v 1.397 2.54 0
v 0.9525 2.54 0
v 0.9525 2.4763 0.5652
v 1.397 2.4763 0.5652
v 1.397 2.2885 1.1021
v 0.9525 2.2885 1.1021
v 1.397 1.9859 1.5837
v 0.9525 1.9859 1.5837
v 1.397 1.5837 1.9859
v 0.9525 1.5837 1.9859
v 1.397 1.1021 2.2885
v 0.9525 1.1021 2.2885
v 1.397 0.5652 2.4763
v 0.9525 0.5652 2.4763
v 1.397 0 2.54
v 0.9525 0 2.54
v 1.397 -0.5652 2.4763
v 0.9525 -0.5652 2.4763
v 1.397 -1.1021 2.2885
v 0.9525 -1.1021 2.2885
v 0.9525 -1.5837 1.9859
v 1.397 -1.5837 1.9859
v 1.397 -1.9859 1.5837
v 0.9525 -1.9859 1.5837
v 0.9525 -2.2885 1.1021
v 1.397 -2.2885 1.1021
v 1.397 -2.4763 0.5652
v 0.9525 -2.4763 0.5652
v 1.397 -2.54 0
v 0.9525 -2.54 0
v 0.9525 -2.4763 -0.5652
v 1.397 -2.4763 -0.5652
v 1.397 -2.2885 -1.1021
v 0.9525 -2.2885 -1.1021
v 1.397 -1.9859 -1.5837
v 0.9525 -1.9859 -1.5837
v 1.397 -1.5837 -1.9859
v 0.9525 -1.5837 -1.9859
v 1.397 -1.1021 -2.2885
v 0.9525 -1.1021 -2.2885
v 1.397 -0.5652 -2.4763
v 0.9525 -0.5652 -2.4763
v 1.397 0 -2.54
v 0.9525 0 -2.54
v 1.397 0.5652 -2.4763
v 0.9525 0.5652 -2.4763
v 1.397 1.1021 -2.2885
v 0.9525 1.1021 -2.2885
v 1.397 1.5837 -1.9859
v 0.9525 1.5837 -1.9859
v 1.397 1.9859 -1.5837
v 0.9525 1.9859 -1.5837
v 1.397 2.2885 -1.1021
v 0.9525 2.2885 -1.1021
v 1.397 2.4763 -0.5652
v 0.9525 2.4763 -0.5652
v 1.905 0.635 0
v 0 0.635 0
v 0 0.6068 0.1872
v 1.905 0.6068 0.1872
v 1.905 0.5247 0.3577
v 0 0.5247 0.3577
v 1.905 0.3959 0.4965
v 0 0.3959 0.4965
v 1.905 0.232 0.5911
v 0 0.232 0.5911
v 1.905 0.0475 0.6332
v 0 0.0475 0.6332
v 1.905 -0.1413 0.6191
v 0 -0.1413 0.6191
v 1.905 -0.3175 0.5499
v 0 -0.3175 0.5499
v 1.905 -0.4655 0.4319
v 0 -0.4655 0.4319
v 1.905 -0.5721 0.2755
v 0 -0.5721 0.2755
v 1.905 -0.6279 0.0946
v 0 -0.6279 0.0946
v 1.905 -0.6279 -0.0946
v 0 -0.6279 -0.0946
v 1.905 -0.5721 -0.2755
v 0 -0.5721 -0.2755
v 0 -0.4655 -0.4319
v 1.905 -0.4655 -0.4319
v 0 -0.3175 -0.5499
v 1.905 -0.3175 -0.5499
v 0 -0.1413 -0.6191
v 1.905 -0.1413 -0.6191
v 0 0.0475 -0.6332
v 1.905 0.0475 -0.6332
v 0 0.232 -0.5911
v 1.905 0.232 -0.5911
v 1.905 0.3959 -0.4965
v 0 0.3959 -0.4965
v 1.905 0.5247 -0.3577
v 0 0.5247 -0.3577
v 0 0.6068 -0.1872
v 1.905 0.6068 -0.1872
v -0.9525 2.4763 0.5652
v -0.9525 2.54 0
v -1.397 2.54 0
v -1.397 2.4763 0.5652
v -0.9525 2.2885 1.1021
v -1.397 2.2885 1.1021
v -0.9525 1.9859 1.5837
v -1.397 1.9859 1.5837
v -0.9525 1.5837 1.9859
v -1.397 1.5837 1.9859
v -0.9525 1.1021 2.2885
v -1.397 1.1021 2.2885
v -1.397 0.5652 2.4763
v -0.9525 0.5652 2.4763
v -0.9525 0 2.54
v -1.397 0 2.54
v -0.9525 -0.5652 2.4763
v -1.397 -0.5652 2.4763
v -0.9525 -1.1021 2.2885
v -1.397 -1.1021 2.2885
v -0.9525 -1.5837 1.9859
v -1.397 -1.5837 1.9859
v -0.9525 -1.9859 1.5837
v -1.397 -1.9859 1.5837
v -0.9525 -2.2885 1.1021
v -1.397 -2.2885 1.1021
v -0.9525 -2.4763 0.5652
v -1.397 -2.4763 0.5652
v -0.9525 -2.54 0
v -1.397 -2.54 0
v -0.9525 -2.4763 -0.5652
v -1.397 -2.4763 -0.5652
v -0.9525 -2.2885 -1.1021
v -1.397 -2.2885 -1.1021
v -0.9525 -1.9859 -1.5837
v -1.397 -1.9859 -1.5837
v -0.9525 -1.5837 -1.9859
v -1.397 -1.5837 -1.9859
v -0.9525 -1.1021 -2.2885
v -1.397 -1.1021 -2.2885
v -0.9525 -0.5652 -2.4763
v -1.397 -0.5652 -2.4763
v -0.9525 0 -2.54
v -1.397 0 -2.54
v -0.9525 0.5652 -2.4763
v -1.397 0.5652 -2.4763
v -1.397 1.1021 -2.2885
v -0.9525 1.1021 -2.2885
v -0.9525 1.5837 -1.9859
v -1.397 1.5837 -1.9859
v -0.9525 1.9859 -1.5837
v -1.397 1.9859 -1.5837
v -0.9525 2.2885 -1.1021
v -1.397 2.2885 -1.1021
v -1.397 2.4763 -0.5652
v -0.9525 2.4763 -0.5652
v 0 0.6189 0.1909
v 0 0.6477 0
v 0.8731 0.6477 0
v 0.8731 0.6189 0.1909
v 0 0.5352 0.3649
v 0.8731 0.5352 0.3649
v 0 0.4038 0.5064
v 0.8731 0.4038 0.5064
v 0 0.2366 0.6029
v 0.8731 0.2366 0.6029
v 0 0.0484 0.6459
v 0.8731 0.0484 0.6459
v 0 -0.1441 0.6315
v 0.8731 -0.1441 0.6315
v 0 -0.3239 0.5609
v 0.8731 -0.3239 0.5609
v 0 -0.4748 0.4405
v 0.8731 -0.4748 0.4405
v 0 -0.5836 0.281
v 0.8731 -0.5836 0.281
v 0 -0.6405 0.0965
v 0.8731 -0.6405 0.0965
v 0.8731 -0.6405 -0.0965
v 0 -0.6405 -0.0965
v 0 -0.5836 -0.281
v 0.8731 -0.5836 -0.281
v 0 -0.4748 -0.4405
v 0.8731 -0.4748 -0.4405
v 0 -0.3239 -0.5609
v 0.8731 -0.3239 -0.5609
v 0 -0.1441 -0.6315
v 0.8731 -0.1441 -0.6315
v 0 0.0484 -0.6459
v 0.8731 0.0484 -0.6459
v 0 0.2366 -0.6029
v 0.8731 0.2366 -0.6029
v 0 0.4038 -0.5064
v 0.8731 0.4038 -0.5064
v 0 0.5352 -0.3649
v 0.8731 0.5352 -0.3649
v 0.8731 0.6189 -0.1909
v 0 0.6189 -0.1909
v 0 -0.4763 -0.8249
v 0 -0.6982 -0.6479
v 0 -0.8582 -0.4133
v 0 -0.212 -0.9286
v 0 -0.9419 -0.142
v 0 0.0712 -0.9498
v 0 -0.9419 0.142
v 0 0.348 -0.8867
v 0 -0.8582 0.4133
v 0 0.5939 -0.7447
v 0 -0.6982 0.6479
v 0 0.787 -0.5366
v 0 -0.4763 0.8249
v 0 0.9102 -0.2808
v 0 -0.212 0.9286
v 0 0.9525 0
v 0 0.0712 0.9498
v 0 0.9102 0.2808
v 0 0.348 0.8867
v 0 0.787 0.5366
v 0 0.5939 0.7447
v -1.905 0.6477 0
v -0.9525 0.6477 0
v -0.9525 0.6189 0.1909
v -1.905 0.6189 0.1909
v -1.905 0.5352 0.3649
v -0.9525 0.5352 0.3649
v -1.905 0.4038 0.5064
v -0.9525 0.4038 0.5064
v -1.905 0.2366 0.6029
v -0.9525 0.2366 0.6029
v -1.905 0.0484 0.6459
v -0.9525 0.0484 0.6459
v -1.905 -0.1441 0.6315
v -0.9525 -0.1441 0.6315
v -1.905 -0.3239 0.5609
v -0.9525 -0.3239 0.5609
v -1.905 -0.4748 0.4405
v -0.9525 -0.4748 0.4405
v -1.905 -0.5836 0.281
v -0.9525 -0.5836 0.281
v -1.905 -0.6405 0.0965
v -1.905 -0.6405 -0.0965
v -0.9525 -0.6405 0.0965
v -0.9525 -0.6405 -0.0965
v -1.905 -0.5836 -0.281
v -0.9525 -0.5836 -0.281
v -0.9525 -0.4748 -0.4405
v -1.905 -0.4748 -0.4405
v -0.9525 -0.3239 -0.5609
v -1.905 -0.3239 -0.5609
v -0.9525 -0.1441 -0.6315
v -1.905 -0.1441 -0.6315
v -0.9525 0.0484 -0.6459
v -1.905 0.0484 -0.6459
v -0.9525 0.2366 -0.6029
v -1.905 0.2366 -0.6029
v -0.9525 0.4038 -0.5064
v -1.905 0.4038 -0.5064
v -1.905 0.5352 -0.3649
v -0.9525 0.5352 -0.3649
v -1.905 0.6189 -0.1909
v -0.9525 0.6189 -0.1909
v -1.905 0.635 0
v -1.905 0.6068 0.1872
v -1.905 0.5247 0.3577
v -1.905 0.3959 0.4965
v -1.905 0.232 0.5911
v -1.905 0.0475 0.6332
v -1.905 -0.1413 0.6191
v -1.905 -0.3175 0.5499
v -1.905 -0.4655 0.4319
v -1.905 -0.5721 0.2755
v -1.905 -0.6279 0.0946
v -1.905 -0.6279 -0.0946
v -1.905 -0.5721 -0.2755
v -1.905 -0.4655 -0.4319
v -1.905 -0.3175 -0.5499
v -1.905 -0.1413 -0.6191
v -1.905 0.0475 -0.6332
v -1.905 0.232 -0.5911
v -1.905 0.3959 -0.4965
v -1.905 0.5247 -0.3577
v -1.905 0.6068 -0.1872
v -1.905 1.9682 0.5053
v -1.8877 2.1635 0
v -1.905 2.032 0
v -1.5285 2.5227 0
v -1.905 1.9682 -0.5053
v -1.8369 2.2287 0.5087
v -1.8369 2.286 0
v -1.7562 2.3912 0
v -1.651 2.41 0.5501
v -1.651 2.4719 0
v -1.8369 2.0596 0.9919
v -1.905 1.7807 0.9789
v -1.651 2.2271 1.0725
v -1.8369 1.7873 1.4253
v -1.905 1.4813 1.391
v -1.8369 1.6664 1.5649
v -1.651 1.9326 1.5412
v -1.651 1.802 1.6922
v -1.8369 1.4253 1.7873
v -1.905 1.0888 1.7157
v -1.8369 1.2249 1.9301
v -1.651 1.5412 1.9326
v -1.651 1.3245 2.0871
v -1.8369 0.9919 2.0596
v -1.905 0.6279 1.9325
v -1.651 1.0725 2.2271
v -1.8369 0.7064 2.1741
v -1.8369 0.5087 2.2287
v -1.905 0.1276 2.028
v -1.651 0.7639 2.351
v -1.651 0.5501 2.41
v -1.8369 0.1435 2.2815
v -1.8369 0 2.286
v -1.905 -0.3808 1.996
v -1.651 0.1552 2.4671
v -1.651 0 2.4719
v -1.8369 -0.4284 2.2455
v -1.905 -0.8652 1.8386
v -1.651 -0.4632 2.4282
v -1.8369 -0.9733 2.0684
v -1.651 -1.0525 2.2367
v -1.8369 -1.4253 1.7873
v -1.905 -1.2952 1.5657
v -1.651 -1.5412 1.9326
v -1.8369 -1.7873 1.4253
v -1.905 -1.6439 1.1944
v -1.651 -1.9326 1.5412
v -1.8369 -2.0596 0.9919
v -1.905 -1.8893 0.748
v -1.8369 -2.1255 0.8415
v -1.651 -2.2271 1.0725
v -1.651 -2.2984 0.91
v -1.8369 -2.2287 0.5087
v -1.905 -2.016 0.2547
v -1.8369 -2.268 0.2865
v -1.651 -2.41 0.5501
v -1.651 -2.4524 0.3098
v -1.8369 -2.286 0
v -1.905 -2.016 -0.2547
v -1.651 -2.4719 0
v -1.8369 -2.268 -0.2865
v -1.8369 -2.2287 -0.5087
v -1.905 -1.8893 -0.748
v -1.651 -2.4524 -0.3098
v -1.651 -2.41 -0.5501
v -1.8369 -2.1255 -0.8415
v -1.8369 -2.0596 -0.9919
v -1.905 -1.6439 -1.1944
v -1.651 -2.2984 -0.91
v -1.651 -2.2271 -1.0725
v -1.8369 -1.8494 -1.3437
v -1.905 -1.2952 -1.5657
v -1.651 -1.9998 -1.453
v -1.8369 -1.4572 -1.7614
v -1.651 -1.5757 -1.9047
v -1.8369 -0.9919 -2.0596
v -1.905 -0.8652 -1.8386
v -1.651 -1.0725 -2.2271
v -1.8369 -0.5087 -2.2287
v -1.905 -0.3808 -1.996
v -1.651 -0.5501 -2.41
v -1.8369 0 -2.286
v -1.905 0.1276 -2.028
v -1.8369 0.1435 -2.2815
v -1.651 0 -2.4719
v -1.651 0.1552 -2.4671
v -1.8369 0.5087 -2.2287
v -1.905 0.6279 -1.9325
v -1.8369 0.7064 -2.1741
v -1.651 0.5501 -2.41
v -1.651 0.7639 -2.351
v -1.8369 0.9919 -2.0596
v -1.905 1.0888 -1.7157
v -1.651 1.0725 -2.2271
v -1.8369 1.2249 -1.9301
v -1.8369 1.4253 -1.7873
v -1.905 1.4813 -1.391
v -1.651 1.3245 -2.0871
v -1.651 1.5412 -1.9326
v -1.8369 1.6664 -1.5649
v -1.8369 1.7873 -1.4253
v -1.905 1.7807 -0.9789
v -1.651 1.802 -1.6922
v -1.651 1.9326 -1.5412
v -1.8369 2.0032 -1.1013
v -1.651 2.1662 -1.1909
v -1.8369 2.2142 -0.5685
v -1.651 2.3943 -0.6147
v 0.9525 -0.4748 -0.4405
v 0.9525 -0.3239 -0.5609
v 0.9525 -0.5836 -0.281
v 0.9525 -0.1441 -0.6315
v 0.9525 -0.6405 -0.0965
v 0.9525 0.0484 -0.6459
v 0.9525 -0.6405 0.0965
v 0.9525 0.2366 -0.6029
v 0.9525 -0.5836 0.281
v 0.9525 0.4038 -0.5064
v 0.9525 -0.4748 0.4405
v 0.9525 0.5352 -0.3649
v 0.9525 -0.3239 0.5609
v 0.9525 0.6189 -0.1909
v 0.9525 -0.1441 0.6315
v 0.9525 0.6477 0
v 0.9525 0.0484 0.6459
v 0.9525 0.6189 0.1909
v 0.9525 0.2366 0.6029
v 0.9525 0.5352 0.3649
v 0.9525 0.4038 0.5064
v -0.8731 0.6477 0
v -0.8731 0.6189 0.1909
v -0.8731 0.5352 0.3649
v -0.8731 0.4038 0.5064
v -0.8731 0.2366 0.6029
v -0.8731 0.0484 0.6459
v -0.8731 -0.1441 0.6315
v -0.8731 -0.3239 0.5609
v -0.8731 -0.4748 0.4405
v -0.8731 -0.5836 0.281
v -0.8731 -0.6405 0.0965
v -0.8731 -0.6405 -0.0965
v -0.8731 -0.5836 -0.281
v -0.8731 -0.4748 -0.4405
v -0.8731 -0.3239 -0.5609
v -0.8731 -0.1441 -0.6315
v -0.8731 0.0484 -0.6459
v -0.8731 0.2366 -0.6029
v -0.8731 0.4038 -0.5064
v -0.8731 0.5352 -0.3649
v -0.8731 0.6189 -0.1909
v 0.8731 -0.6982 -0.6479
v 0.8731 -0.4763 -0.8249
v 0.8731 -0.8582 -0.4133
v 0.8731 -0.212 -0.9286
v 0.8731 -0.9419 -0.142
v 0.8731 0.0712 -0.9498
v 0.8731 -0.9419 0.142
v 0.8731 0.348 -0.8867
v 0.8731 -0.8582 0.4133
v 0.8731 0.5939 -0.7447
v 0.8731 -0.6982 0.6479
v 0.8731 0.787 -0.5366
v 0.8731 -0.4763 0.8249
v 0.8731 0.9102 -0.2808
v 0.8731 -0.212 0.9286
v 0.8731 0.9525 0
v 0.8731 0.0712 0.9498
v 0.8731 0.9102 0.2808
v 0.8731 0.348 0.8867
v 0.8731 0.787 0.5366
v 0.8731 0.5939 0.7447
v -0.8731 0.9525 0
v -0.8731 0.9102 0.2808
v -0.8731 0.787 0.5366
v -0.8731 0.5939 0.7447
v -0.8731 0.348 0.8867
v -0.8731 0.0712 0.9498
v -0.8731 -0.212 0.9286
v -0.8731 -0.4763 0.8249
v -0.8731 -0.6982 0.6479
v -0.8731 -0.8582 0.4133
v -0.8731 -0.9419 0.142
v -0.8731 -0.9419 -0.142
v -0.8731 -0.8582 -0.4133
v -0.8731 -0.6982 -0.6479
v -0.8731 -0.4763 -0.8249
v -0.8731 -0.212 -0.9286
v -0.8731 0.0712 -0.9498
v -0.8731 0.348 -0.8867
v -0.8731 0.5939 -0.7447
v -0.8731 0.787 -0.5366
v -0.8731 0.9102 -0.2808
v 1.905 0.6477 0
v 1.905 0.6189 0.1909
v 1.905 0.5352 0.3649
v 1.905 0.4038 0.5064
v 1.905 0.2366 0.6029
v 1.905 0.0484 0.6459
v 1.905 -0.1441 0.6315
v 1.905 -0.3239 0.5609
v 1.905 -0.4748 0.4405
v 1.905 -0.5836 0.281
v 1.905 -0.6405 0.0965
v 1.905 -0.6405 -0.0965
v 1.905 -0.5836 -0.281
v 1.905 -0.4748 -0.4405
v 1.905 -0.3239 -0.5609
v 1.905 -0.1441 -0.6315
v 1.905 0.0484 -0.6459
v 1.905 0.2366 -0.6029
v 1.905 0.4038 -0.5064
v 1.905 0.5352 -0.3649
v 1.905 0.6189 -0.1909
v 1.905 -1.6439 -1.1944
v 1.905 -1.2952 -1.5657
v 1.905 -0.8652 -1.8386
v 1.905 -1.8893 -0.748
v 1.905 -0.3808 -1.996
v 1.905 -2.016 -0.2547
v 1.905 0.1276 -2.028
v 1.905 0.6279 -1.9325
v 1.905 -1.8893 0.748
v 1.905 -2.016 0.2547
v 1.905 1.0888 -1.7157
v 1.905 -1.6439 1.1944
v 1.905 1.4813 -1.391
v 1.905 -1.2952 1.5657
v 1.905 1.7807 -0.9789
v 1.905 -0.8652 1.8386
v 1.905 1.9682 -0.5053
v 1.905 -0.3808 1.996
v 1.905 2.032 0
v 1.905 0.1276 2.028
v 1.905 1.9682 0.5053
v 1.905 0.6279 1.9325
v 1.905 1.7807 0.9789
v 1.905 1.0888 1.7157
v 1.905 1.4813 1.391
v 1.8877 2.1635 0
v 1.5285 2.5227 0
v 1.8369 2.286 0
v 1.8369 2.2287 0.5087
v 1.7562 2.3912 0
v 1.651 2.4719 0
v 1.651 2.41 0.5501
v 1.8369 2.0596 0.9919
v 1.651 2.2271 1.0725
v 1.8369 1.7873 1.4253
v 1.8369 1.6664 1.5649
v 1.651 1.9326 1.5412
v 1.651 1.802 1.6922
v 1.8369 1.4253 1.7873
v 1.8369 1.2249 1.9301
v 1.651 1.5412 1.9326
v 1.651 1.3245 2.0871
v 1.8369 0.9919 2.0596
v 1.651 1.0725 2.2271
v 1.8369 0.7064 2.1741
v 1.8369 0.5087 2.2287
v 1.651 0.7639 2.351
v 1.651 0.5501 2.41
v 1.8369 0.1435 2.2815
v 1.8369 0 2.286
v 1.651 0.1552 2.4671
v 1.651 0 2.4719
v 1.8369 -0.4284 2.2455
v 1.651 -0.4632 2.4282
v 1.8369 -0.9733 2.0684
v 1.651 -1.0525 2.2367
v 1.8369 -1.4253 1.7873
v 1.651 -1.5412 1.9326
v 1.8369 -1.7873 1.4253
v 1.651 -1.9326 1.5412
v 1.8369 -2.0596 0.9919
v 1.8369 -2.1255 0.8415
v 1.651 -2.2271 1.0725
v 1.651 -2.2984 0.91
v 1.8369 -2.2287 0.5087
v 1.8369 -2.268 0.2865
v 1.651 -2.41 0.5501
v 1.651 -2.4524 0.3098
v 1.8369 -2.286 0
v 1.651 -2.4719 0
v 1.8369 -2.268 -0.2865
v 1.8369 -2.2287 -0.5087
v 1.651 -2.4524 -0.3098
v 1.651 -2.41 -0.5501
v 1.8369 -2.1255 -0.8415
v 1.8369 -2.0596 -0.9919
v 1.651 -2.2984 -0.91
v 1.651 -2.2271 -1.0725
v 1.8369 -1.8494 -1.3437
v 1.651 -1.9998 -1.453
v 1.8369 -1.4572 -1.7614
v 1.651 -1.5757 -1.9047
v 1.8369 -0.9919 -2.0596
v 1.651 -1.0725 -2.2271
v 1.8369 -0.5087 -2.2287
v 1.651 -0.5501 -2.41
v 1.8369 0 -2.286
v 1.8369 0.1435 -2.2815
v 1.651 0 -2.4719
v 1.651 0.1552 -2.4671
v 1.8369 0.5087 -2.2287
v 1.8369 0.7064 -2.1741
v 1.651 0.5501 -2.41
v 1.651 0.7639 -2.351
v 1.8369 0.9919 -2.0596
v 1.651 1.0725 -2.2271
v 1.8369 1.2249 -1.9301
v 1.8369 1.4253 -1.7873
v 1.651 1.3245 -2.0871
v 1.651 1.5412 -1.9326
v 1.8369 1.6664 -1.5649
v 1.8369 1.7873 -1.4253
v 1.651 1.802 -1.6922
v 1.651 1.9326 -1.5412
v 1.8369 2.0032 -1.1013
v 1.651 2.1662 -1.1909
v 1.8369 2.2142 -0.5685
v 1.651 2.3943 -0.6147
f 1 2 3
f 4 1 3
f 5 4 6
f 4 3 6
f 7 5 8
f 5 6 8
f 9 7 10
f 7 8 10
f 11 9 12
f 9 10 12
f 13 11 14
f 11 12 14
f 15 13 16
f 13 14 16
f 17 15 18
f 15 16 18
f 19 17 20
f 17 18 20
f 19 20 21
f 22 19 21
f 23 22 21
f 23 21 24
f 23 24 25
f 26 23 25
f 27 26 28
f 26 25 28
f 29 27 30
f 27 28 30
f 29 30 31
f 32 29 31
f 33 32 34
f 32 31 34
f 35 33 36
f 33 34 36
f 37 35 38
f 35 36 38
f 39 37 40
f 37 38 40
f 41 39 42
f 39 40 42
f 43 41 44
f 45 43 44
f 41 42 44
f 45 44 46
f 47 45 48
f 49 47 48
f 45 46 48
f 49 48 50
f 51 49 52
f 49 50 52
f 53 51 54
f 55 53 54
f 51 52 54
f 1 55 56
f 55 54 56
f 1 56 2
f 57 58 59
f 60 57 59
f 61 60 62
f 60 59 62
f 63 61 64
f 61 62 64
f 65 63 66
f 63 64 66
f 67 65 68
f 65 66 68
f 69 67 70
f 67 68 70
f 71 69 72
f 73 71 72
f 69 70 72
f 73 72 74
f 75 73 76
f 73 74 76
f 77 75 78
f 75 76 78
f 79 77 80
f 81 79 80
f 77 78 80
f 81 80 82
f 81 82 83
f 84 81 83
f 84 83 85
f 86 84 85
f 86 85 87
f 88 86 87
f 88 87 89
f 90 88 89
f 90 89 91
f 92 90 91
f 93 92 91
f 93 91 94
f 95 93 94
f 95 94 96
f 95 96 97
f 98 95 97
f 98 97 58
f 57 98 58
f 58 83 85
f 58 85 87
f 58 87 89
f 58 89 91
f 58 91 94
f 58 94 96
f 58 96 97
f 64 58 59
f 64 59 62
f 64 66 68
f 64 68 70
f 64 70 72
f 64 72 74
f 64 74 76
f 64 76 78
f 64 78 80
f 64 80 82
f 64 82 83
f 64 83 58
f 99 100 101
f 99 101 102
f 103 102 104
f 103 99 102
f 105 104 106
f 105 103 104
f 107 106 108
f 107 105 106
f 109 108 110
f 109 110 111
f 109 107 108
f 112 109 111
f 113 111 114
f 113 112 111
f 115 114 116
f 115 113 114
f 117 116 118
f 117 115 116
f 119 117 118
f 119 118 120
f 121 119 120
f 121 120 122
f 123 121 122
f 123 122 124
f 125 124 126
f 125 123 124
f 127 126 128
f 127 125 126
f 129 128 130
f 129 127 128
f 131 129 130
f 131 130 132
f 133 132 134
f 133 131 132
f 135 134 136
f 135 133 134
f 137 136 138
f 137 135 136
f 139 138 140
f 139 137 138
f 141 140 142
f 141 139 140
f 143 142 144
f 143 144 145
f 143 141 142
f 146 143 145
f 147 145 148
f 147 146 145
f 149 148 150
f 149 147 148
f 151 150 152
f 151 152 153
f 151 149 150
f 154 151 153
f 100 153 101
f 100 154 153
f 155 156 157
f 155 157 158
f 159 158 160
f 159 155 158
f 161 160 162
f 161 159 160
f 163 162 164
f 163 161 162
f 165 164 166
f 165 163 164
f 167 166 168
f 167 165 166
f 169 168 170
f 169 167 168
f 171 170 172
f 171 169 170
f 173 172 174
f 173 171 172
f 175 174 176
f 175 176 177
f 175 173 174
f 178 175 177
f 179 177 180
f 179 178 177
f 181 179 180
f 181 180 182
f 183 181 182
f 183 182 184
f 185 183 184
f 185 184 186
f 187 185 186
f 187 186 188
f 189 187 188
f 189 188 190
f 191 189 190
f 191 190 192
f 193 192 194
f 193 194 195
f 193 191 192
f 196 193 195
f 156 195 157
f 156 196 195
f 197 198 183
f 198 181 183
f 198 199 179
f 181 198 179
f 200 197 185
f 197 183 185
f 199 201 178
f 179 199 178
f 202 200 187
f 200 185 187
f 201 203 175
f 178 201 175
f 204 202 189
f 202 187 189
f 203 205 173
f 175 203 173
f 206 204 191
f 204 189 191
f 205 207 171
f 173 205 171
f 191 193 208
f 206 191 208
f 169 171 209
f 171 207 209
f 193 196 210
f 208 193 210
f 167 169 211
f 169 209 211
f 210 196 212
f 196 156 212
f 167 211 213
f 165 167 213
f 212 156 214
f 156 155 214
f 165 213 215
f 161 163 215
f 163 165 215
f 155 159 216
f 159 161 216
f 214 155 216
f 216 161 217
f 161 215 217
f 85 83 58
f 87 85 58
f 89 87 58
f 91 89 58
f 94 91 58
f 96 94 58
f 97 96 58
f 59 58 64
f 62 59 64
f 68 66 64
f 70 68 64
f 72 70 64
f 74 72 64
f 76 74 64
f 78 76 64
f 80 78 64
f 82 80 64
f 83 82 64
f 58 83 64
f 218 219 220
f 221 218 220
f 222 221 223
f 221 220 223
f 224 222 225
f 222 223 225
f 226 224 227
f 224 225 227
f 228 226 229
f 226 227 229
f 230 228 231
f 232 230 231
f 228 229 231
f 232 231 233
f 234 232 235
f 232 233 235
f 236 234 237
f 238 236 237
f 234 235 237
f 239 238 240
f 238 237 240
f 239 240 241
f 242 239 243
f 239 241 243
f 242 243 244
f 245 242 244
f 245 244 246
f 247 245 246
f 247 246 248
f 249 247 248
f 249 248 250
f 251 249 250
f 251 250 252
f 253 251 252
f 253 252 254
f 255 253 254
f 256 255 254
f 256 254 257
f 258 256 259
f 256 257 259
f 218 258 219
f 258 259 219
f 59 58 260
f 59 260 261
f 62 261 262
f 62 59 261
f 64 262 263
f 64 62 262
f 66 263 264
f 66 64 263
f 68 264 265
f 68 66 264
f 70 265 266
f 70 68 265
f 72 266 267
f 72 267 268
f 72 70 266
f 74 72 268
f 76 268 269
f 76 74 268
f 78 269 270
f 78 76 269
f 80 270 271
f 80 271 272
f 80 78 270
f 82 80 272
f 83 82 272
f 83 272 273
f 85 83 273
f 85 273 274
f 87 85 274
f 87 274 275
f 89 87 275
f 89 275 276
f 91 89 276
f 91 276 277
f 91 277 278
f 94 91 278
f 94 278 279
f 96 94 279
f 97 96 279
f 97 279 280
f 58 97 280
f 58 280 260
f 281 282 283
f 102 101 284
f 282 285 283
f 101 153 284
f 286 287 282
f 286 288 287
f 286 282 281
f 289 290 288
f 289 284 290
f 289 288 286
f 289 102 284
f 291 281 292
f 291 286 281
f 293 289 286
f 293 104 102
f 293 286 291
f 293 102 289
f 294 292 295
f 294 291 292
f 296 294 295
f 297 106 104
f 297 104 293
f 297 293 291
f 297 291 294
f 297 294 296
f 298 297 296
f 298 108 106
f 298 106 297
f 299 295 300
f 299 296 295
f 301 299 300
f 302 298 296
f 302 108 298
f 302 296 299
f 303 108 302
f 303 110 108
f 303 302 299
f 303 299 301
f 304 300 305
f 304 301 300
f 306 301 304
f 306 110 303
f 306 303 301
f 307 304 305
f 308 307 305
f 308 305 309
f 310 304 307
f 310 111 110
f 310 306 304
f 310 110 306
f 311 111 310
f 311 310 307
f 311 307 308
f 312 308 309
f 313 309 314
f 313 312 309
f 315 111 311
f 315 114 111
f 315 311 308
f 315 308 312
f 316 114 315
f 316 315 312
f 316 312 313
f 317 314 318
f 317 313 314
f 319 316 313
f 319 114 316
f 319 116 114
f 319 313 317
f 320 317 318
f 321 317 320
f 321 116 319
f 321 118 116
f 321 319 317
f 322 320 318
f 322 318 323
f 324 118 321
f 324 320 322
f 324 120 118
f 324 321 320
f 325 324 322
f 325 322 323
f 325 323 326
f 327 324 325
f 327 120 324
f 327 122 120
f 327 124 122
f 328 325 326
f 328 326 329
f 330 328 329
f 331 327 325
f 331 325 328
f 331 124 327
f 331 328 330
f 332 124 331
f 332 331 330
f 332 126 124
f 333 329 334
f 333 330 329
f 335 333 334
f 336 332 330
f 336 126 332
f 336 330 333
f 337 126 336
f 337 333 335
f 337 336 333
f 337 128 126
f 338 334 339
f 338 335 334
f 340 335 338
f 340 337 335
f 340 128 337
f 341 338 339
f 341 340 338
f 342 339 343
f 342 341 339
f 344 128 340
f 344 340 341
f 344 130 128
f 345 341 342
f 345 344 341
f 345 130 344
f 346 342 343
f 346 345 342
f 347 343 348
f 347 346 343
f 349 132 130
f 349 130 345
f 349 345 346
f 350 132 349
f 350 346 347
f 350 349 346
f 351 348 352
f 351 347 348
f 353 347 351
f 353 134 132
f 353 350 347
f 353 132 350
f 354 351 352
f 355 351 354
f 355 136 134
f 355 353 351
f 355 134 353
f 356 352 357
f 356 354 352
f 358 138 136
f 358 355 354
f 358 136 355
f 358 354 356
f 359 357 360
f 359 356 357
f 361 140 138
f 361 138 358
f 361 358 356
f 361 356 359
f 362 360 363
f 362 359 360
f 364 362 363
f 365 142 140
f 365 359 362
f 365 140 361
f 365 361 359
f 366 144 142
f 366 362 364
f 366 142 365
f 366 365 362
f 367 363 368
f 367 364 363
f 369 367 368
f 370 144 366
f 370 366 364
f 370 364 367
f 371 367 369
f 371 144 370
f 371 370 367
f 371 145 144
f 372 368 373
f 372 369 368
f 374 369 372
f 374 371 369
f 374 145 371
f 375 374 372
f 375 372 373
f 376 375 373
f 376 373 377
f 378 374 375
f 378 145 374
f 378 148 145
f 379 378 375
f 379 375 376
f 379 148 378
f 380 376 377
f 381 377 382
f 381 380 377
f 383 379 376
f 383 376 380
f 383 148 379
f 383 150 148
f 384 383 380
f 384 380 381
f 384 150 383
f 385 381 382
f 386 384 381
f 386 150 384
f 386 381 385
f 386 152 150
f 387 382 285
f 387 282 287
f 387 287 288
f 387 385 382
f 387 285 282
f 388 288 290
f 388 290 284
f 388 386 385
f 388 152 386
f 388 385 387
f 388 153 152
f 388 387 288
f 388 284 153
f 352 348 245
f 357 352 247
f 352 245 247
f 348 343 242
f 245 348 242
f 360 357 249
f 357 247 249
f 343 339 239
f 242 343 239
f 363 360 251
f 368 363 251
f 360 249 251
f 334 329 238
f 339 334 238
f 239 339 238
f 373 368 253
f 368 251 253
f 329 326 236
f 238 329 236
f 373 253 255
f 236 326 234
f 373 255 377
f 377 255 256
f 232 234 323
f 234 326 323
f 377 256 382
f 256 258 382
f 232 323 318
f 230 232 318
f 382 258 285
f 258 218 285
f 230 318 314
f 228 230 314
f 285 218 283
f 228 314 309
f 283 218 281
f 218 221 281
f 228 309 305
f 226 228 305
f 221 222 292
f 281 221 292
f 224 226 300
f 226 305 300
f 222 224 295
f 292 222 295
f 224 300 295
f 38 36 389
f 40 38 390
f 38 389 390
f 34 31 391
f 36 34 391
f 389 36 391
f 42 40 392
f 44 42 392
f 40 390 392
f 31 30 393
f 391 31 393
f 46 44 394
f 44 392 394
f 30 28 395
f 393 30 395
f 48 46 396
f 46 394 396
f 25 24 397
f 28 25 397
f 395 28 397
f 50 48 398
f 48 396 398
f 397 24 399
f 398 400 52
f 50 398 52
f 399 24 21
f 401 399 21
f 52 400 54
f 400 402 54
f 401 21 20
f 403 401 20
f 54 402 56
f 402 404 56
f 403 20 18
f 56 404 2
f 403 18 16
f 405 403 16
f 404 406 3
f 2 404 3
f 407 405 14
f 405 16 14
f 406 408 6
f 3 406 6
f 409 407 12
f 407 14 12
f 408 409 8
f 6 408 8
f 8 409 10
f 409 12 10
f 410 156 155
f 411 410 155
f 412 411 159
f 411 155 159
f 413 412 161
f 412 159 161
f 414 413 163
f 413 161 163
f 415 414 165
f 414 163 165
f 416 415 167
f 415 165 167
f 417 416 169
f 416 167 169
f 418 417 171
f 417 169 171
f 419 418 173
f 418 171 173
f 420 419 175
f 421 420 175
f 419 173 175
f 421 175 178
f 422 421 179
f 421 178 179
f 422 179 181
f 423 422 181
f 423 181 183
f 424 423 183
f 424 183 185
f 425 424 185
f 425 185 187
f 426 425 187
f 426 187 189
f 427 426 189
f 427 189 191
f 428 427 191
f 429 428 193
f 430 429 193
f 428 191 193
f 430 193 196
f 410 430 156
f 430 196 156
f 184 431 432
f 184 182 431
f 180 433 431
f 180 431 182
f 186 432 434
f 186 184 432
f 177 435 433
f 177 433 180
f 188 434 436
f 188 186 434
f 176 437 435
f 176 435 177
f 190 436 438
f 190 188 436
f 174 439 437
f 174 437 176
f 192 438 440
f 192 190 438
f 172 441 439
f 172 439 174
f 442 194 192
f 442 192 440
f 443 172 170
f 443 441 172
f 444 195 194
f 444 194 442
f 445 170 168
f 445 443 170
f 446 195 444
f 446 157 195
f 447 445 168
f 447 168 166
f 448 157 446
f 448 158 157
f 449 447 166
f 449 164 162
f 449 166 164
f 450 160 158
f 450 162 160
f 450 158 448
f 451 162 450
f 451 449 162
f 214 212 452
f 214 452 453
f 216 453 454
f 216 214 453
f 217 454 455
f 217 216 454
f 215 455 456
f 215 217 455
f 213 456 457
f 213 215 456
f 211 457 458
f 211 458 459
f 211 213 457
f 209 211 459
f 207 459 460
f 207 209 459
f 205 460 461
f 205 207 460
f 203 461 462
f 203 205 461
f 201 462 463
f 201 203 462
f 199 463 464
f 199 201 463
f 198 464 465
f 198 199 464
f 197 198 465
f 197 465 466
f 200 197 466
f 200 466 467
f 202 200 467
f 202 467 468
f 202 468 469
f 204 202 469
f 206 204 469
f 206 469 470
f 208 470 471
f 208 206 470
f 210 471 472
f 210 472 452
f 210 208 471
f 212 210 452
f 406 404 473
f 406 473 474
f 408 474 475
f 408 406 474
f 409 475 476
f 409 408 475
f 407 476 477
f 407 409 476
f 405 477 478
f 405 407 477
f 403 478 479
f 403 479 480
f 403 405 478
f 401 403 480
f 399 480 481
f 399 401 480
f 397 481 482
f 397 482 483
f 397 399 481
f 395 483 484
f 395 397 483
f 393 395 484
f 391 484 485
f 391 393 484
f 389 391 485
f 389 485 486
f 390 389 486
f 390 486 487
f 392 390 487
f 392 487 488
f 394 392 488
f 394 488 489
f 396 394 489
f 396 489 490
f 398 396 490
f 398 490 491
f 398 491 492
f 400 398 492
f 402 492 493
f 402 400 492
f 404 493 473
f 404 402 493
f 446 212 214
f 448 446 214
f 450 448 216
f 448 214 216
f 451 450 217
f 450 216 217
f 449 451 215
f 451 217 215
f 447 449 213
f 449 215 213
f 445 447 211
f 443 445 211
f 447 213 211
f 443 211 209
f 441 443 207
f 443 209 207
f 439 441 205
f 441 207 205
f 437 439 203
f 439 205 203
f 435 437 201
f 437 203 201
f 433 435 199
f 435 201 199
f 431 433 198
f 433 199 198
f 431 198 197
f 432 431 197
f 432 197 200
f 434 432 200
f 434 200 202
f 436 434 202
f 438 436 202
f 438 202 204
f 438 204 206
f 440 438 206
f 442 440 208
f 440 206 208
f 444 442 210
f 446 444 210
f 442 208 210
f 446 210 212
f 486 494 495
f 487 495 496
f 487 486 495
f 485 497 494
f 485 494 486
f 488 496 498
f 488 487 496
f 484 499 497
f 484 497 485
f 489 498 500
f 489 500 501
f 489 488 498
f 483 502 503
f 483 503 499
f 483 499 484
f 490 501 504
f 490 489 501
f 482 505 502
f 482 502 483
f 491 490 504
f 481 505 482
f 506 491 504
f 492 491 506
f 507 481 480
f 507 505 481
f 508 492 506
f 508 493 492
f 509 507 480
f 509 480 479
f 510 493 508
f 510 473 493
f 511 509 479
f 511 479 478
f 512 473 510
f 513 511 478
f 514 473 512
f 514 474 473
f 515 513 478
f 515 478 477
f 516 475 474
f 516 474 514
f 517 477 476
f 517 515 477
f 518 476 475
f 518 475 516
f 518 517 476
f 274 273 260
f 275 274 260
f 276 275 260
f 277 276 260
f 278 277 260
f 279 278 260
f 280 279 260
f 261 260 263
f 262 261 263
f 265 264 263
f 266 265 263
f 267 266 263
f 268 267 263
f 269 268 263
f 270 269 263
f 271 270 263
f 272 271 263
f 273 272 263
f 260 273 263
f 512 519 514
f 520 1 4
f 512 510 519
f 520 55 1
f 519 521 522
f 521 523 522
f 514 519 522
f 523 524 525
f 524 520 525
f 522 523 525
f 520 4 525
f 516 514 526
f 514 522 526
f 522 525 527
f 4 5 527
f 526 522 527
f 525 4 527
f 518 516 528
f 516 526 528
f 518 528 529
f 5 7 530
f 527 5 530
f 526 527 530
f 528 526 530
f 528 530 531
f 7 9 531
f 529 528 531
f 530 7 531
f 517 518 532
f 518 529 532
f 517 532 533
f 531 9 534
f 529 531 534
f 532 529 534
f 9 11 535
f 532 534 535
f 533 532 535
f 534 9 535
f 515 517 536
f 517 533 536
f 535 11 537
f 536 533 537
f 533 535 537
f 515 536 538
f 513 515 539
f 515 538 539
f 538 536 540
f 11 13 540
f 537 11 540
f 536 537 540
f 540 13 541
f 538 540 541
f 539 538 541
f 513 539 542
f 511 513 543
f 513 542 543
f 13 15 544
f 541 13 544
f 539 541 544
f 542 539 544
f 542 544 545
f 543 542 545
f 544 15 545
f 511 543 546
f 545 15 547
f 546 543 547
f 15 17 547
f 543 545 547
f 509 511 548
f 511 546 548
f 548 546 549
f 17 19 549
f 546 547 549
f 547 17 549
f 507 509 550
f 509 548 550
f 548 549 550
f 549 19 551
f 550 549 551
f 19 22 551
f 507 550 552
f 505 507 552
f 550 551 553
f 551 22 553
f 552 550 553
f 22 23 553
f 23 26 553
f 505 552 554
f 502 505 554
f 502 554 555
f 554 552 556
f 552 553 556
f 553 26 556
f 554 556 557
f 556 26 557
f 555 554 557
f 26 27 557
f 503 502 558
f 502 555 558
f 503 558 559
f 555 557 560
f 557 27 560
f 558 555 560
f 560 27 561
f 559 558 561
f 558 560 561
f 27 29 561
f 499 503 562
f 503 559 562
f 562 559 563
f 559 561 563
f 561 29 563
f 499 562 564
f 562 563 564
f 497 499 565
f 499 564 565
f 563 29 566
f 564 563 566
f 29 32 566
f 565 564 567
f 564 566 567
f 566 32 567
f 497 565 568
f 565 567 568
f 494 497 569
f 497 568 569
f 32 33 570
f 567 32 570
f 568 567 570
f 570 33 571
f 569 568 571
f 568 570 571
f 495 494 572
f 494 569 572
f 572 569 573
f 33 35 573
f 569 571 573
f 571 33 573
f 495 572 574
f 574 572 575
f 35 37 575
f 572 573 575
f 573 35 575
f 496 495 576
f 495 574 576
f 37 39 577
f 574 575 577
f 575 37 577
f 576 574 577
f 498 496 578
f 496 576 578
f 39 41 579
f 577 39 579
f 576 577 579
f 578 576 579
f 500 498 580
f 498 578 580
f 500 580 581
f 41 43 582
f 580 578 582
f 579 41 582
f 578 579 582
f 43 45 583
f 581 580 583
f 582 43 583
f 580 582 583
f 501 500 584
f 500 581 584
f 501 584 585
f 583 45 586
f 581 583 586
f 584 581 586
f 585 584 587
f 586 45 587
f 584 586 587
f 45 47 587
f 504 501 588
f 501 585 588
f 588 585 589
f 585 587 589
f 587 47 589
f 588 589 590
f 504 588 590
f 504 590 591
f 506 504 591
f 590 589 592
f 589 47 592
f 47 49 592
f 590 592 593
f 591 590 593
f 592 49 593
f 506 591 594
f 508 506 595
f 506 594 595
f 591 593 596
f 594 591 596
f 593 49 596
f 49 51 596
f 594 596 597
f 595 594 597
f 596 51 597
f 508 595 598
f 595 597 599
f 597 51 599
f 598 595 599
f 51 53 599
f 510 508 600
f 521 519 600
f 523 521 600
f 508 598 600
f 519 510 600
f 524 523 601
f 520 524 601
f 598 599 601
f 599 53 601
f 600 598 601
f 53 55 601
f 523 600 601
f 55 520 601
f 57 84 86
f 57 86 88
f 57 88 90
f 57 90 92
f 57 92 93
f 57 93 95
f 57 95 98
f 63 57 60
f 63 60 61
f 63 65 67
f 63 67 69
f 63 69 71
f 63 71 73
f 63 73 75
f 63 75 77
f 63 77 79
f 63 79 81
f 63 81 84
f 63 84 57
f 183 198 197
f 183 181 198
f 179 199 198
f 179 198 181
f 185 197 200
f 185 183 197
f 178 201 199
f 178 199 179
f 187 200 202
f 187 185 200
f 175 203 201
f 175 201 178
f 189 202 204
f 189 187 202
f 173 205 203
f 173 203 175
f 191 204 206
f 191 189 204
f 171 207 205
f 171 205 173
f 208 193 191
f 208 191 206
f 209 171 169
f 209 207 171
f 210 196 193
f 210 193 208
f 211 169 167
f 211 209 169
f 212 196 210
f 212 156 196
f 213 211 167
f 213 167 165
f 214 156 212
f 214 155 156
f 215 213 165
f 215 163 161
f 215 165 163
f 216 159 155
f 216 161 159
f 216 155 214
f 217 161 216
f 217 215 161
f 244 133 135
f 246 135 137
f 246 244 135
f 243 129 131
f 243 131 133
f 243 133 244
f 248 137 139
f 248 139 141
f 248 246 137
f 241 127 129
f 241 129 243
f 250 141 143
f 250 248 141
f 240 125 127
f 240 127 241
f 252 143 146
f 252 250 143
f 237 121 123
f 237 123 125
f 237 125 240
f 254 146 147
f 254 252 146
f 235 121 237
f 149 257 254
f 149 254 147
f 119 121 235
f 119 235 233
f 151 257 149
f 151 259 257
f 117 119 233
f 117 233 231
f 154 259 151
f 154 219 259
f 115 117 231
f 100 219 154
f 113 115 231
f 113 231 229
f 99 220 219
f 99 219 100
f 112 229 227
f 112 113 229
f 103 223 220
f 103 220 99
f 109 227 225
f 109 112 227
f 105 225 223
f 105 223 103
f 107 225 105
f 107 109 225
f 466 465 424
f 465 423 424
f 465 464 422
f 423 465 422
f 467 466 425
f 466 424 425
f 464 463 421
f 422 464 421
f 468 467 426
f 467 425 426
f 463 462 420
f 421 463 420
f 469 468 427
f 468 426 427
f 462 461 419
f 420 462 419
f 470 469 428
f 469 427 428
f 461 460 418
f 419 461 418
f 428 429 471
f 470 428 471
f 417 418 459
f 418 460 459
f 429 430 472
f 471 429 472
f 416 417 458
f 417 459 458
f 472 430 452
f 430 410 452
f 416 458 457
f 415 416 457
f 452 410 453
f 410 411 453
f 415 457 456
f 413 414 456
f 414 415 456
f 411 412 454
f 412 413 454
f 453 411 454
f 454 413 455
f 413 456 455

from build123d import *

# Parameters (mm, degrees)
F0_R     = 2.54
F0_R_2   = 0.9525
F1_DEPTH = 0.9525
F0_R_3   = 0.635
F2_DEPTH = 0.9525
F0_R_4   = 0.6477
F4_DEPTH = 1.905
F5_DEPTH = 0.873125
F7_R     = 0.508
F7_2_R   = 0.508


with BuildPart() as f1:
    # F0 (on Right) → F1 (new body)
    with BuildSketch(Plane.YZ):
        Circle(F0_R)
        Circle(F0_R_2, mode=Mode.SUBTRACT)
    extrude(amount=F1_DEPTH)

    # F0 (on Right) → F2, piece 2 (join)
    with BuildSketch(Plane.YZ):
        Circle(F0_R_2)
        Circle(F0_R_4, mode=Mode.SUBTRACT)
    extrude(amount=F2_DEPTH)


with BuildPart() as f2:
    # F0 (on Right) → F2 (new body)
    with BuildSketch(Plane.YZ):
        Circle(F0_R_3)
    extrude(amount=F2_DEPTH)


with BuildPart() as f1_1:
    # F3: moved
    add(f1.part.moved(Location((0.9525, 0, 0))))


with BuildPart() as f2_1:
    # F3: moved
    add(f2.part.moved(Location((0.9525, 0, 0))))

    # F0 (on Right) → F4 (join)
    with BuildSketch(Plane.YZ):
        Circle(F0_R_3)
    extrude(amount=F4_DEPTH)


with BuildPart() as f5:
    # F0 (on Right) → F5 (new body)
    with BuildSketch(Plane.YZ):
        Circle(F0_R_2)
        Circle(F0_R_4, mode=Mode.SUBTRACT)
    extrude(amount=F5_DEPTH)


with BuildPart() as f6_1:
    # F6: instance of F1
    add(f1_1.part.mirror(Plane.YZ))

    # F7#2
    f7_2_edges = [f6_1.edges().sort_by_distance(p)[0] for p in [
        (-1.905, -2.54, 0),
    ]]
    fillet(f7_2_edges, radius=F7_2_R)


with BuildPart() as f6_2:
    # F6: instance of F2
    add(f2_1.part.mirror(Plane.YZ))


with BuildPart() as f6_3:
    # F6: instance of F5
    add(f5.part.mirror(Plane.YZ))


with BuildPart() as f1_2:
    add(f1_1.part)

    # F7
    f7_edges = [f1_2.edges().sort_by_distance(p)[0] for p in [
        (1.905, -2.54, 0),
    ]]
    fillet(f7_edges, radius=F7_R)


solid = Compound([f2_1.part, f5.part, f6_1.part, f6_2.part, f6_3.part, f1_2.part])
